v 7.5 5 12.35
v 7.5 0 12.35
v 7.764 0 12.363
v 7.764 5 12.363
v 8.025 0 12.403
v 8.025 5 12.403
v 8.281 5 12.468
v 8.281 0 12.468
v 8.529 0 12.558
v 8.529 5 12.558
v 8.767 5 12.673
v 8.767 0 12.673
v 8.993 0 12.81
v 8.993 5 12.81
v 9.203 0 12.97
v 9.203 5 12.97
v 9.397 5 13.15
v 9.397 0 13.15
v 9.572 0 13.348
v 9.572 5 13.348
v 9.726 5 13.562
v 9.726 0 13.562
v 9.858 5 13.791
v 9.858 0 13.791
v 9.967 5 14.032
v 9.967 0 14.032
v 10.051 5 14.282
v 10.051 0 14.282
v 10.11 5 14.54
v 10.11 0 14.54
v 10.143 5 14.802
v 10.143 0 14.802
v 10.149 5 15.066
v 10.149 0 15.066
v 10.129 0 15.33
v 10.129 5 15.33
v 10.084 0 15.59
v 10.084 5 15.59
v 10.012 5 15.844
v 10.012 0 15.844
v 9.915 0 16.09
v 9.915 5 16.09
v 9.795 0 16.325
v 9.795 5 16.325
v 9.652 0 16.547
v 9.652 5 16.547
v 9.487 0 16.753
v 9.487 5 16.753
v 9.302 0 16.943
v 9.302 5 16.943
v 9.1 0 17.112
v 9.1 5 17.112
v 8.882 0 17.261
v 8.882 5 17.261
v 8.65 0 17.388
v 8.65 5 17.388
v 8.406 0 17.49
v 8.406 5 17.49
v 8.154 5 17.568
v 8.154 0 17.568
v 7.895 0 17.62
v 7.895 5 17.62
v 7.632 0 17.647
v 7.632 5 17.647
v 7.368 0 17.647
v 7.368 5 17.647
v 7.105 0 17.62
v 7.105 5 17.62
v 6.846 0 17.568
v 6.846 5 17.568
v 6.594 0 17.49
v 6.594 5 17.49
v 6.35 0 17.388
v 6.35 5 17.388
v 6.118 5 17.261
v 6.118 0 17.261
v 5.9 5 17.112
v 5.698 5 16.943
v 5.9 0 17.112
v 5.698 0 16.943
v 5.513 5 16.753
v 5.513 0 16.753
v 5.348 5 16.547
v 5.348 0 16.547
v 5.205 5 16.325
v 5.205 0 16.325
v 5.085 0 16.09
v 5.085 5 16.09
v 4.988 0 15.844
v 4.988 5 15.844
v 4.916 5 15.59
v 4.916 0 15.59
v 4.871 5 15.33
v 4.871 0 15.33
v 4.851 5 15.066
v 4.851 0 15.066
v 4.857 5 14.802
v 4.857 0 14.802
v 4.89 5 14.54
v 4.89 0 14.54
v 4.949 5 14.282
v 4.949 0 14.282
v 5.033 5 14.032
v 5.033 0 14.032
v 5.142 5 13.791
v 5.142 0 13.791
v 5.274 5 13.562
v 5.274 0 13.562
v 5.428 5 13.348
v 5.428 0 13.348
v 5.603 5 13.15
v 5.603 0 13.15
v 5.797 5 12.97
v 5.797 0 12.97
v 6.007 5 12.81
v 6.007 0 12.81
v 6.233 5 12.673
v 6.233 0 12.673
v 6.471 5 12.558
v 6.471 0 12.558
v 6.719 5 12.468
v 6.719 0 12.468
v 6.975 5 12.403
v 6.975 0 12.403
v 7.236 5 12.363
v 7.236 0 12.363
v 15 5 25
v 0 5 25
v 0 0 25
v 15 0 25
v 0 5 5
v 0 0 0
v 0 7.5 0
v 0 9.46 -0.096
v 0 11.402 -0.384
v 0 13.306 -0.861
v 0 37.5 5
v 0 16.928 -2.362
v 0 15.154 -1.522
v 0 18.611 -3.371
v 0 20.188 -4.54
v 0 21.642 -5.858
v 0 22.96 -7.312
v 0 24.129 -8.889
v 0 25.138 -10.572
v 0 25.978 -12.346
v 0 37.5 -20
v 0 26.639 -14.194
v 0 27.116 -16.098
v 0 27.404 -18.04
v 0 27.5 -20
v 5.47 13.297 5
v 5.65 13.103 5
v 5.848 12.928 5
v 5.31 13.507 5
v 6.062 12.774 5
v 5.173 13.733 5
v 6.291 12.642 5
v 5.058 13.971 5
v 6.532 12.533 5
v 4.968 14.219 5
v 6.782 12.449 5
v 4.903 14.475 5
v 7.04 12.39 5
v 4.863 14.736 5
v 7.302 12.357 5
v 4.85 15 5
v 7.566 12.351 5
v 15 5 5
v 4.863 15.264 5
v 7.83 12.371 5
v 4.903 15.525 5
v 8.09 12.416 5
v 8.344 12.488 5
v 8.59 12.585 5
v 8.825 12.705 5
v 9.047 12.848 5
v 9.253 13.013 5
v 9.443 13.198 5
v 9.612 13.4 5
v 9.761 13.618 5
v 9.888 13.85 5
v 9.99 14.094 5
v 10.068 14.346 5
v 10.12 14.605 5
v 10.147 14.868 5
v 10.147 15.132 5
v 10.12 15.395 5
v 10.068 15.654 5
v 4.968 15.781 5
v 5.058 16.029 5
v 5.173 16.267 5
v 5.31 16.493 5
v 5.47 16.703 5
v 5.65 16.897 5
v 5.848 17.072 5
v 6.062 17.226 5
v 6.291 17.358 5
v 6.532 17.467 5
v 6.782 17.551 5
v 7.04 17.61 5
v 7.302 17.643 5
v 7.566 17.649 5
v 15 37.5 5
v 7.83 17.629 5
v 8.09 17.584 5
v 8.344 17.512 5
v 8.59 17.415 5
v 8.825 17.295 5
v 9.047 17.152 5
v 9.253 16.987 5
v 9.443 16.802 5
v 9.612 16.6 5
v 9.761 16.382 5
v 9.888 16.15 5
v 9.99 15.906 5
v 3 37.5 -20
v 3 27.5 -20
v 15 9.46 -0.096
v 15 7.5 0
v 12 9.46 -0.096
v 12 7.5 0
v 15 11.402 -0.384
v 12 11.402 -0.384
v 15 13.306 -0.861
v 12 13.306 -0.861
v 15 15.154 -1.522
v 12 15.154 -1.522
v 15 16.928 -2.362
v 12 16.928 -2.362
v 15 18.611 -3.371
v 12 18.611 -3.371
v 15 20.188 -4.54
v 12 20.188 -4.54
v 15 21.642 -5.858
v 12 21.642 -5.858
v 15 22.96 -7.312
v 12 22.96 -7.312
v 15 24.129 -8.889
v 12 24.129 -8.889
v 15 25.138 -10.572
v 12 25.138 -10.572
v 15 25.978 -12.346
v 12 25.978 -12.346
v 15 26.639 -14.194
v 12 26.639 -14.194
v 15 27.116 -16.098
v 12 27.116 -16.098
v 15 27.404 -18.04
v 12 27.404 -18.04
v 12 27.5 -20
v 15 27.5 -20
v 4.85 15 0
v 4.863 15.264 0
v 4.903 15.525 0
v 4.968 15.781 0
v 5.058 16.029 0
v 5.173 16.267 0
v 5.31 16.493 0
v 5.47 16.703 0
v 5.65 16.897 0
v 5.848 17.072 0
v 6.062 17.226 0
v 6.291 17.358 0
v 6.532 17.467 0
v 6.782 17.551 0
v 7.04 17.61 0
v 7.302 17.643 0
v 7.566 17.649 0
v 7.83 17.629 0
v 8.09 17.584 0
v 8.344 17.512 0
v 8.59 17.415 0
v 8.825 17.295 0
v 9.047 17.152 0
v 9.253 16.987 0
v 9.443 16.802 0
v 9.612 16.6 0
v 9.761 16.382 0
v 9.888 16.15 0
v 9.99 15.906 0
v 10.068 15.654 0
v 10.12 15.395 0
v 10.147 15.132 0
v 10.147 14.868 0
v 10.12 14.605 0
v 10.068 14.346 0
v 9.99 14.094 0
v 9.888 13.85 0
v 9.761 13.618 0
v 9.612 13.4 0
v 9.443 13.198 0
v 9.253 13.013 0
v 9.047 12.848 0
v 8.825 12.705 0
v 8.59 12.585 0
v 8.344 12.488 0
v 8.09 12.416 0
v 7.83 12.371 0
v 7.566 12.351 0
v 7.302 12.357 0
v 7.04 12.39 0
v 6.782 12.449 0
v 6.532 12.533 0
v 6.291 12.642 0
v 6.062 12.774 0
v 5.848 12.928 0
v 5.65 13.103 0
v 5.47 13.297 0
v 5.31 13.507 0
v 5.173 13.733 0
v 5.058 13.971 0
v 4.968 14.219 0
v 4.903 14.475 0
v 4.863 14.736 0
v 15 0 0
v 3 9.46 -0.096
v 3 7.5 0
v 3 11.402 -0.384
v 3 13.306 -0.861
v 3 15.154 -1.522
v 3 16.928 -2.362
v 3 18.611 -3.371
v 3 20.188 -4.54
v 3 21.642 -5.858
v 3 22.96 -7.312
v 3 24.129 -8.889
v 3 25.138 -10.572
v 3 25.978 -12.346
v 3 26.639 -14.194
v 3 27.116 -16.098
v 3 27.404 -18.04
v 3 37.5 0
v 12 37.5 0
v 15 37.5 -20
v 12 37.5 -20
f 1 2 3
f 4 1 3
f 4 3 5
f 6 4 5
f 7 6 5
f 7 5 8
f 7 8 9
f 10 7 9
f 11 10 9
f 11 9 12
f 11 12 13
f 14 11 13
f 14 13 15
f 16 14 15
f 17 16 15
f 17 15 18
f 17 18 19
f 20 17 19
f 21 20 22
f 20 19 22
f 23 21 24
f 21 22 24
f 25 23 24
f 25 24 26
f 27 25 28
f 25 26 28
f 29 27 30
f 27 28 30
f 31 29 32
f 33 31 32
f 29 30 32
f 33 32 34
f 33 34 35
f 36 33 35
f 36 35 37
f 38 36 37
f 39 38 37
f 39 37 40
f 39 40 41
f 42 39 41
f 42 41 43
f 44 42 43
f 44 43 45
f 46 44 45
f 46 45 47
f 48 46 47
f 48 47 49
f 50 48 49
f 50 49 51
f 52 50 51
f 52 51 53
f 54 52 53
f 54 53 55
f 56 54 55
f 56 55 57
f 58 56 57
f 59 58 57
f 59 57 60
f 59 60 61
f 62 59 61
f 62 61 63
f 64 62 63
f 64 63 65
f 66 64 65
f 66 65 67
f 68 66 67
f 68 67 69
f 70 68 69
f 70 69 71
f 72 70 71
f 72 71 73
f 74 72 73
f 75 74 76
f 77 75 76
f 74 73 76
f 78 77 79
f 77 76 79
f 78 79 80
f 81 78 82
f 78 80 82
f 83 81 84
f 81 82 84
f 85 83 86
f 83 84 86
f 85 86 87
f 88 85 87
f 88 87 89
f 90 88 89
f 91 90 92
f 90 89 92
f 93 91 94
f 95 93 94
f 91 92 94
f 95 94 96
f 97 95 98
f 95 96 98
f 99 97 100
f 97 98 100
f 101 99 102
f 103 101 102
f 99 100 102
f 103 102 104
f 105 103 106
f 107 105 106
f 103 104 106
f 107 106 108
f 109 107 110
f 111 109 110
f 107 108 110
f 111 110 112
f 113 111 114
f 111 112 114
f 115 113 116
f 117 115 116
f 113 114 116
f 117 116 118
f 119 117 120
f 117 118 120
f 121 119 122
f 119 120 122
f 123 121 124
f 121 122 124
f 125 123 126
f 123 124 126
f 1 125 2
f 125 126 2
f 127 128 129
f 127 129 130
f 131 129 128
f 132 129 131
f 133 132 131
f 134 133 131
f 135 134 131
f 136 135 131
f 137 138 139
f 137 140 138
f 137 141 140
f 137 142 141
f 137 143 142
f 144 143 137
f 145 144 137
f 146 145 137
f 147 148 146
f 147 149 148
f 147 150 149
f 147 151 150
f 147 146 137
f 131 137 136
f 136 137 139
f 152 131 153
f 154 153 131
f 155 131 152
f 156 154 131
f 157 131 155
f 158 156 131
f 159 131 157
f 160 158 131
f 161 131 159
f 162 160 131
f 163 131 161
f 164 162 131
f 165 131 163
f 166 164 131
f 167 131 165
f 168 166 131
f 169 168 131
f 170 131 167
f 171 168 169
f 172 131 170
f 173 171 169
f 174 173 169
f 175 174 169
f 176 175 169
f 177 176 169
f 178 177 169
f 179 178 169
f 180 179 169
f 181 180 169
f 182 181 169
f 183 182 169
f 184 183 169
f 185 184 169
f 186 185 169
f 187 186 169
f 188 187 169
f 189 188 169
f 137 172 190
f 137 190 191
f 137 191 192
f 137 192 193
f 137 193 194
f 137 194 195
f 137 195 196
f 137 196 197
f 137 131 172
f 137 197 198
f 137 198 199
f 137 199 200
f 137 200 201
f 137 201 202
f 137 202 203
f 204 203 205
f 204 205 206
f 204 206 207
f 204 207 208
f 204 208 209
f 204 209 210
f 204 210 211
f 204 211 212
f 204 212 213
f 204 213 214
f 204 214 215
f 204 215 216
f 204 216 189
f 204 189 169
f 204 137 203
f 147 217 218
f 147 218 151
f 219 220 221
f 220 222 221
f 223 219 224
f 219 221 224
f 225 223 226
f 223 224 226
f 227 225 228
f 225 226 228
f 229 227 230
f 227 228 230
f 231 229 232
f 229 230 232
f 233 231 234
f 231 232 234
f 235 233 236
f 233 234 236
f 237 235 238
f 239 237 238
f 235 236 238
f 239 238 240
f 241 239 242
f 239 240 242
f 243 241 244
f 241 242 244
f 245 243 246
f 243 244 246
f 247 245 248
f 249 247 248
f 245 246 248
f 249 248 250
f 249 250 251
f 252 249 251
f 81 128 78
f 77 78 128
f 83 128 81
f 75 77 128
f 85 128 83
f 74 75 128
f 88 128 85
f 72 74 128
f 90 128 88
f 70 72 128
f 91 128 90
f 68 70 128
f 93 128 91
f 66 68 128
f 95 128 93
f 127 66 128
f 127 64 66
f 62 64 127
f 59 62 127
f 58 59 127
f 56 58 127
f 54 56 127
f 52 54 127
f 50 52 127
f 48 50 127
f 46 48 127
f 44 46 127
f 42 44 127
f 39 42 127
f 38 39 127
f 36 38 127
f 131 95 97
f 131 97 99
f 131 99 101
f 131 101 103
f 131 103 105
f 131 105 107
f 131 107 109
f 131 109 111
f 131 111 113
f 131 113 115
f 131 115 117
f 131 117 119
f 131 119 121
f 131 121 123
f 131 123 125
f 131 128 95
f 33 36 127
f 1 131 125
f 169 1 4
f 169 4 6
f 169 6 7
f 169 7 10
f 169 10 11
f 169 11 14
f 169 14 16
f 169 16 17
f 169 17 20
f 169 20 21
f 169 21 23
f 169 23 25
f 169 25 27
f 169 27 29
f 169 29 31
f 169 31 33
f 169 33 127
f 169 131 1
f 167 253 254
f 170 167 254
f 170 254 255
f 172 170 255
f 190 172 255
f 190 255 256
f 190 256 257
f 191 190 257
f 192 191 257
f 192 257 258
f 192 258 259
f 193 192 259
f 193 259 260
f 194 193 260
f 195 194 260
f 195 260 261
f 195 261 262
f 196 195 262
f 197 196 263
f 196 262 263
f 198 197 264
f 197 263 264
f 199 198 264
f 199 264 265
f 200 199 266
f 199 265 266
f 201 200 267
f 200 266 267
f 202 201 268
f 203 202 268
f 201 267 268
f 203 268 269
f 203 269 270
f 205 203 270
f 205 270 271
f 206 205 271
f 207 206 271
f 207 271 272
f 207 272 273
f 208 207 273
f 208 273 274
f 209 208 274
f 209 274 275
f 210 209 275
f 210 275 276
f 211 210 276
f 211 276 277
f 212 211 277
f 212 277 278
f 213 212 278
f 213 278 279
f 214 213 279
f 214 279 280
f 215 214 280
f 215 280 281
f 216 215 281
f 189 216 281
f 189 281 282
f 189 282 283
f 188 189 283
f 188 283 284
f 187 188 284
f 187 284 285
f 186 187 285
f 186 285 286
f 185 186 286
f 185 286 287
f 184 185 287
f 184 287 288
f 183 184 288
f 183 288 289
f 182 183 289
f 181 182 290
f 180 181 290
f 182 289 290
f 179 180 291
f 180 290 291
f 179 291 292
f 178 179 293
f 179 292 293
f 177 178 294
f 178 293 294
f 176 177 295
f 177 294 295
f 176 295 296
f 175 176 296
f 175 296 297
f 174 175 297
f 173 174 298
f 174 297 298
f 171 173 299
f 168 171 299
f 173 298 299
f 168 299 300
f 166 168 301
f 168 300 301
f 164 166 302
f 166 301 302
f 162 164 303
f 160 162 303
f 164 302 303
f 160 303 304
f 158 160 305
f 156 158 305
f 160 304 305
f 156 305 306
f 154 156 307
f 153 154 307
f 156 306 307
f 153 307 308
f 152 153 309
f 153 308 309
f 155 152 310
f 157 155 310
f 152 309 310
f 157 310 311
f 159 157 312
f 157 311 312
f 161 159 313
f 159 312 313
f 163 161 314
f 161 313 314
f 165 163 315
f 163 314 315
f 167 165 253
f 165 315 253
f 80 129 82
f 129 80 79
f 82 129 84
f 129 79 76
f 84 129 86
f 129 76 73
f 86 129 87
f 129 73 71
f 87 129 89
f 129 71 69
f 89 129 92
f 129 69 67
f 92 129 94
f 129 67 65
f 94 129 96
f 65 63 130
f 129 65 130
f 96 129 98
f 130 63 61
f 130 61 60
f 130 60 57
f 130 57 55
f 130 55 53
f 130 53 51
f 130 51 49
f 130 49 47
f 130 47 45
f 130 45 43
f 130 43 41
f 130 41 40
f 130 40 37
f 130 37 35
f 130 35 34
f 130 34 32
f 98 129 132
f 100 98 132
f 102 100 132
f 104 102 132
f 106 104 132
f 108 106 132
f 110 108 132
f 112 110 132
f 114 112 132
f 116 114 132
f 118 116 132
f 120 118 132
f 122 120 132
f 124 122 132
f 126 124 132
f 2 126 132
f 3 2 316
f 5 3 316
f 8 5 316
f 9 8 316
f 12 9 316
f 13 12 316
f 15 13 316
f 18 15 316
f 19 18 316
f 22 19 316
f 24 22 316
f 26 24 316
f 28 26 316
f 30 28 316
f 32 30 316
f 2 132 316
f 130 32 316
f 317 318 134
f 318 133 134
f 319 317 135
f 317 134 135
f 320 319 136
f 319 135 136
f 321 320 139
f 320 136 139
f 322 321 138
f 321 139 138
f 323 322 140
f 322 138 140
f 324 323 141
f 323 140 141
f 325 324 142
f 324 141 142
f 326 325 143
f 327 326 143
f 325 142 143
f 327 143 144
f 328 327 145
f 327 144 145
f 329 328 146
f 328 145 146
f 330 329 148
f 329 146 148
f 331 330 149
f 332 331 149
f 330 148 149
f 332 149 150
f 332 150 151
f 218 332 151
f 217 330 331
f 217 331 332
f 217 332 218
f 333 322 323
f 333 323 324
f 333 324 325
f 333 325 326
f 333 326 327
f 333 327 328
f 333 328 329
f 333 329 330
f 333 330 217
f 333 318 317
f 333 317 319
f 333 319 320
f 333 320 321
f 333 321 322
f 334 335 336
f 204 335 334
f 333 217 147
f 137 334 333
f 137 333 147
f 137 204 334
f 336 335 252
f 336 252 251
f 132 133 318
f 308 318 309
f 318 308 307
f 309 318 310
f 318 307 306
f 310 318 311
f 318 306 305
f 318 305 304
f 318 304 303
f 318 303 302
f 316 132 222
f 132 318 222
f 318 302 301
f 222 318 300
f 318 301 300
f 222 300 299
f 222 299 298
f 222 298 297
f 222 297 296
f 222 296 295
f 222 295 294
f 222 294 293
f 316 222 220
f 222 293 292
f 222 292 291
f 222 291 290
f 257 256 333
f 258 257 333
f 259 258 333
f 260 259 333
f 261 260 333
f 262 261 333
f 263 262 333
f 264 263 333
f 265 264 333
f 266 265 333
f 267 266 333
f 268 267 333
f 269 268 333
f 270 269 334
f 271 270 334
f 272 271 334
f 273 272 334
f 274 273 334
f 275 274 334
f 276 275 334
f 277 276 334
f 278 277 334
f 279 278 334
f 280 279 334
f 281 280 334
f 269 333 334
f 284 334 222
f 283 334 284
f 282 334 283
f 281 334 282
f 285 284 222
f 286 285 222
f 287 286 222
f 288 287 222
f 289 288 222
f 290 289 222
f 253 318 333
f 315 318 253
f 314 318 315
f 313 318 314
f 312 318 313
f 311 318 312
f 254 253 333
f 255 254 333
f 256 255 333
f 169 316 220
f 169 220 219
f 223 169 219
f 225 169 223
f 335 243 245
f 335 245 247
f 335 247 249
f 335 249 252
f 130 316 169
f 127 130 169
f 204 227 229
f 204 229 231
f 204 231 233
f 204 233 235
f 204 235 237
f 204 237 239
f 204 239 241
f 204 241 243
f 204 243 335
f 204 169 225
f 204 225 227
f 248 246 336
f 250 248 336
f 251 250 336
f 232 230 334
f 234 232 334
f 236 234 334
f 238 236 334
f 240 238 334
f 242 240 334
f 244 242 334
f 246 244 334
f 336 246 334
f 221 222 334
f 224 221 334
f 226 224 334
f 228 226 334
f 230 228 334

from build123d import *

# Parameters (mm, degrees)
SKETCH2_W           = 15
SKETCH2_H           = 37.5
BOSS_EXTRUDE1_DEPTH = 5
SKETCH3_W           = 15
SKETCH3_H           = 5
BOSS_EXTRUDE2_DEPTH = 20
SKETCH4_W           = 3
SKETCH4_H           = 10
BOSS_EXTRUDE3_DEPTH = 20
FILLET1_R           = 20
SKETCH6_R           = 2.65
CUT_EXTRUDE2_DEPTH  = 10
SKETCH7_R           = 2.65
CUT_EXTRUDE3_DEPTH  = 10


with BuildPart() as part:
    # Sketch2 → Boss-Extrude1 (new body)
    with BuildSketch(Plane.XY):
        with Locations((7.5, 18.75)):
            Rectangle(SKETCH2_W, SKETCH2_H)
    extrude(amount=BOSS_EXTRUDE1_DEPTH)

    # Sketch3 → Boss-Extrude2 (add)
    with BuildSketch(Plane.XY.offset(5)):
        with Locations((7.5, 2.5)):
            Rectangle(SKETCH3_W, SKETCH3_H)
    extrude(amount=BOSS_EXTRUDE2_DEPTH)

    # Sketch4 → Boss-Extrude3 (add)
    with BuildSketch(Plane(origin=(0, 0, 0), x_dir=(-1, 0, 0), z_dir=(0, 0, -1))):
        with Locations((-13.5, 32.5)):
            Rectangle(SKETCH4_W, SKETCH4_H)
        with Locations((-1.5, 32.5)):
            Rectangle(SKETCH4_W, SKETCH4_H)
    extrude(amount=BOSS_EXTRUDE3_DEPTH)

    # Fillet1
    fillet1_edges = [part.edges().sort_by_distance(p)[0] for p in [
        (1.5, 27.5, 0),
        (13.5, 27.5, 0),
    ]]
    fillet(fillet1_edges, radius=FILLET1_R - 0.0001)  # a hair under: the kernel refuses the full size

    # Sketch6 → Cut-Extrude2 (cut)
    with BuildSketch(Plane.XZ):
        with Locations(Location((7.5, 15, 0), (0, 0, 270))):
            Circle(SKETCH6_R)
    extrude(amount=-CUT_EXTRUDE2_DEPTH, mode=Mode.SUBTRACT)

    # Sketch7 → Cut-Extrude3 (cut)
    with BuildSketch(Plane(origin=(0, 0, 0), x_dir=(-1, 0, 0), z_dir=(0, 0, -1))):
        with Locations((-7.5, 15)):
            Circle(SKETCH7_R)
    extrude(amount=-CUT_EXTRUDE3_DEPTH, mode=Mode.SUBTRACT)


solid = part.part
